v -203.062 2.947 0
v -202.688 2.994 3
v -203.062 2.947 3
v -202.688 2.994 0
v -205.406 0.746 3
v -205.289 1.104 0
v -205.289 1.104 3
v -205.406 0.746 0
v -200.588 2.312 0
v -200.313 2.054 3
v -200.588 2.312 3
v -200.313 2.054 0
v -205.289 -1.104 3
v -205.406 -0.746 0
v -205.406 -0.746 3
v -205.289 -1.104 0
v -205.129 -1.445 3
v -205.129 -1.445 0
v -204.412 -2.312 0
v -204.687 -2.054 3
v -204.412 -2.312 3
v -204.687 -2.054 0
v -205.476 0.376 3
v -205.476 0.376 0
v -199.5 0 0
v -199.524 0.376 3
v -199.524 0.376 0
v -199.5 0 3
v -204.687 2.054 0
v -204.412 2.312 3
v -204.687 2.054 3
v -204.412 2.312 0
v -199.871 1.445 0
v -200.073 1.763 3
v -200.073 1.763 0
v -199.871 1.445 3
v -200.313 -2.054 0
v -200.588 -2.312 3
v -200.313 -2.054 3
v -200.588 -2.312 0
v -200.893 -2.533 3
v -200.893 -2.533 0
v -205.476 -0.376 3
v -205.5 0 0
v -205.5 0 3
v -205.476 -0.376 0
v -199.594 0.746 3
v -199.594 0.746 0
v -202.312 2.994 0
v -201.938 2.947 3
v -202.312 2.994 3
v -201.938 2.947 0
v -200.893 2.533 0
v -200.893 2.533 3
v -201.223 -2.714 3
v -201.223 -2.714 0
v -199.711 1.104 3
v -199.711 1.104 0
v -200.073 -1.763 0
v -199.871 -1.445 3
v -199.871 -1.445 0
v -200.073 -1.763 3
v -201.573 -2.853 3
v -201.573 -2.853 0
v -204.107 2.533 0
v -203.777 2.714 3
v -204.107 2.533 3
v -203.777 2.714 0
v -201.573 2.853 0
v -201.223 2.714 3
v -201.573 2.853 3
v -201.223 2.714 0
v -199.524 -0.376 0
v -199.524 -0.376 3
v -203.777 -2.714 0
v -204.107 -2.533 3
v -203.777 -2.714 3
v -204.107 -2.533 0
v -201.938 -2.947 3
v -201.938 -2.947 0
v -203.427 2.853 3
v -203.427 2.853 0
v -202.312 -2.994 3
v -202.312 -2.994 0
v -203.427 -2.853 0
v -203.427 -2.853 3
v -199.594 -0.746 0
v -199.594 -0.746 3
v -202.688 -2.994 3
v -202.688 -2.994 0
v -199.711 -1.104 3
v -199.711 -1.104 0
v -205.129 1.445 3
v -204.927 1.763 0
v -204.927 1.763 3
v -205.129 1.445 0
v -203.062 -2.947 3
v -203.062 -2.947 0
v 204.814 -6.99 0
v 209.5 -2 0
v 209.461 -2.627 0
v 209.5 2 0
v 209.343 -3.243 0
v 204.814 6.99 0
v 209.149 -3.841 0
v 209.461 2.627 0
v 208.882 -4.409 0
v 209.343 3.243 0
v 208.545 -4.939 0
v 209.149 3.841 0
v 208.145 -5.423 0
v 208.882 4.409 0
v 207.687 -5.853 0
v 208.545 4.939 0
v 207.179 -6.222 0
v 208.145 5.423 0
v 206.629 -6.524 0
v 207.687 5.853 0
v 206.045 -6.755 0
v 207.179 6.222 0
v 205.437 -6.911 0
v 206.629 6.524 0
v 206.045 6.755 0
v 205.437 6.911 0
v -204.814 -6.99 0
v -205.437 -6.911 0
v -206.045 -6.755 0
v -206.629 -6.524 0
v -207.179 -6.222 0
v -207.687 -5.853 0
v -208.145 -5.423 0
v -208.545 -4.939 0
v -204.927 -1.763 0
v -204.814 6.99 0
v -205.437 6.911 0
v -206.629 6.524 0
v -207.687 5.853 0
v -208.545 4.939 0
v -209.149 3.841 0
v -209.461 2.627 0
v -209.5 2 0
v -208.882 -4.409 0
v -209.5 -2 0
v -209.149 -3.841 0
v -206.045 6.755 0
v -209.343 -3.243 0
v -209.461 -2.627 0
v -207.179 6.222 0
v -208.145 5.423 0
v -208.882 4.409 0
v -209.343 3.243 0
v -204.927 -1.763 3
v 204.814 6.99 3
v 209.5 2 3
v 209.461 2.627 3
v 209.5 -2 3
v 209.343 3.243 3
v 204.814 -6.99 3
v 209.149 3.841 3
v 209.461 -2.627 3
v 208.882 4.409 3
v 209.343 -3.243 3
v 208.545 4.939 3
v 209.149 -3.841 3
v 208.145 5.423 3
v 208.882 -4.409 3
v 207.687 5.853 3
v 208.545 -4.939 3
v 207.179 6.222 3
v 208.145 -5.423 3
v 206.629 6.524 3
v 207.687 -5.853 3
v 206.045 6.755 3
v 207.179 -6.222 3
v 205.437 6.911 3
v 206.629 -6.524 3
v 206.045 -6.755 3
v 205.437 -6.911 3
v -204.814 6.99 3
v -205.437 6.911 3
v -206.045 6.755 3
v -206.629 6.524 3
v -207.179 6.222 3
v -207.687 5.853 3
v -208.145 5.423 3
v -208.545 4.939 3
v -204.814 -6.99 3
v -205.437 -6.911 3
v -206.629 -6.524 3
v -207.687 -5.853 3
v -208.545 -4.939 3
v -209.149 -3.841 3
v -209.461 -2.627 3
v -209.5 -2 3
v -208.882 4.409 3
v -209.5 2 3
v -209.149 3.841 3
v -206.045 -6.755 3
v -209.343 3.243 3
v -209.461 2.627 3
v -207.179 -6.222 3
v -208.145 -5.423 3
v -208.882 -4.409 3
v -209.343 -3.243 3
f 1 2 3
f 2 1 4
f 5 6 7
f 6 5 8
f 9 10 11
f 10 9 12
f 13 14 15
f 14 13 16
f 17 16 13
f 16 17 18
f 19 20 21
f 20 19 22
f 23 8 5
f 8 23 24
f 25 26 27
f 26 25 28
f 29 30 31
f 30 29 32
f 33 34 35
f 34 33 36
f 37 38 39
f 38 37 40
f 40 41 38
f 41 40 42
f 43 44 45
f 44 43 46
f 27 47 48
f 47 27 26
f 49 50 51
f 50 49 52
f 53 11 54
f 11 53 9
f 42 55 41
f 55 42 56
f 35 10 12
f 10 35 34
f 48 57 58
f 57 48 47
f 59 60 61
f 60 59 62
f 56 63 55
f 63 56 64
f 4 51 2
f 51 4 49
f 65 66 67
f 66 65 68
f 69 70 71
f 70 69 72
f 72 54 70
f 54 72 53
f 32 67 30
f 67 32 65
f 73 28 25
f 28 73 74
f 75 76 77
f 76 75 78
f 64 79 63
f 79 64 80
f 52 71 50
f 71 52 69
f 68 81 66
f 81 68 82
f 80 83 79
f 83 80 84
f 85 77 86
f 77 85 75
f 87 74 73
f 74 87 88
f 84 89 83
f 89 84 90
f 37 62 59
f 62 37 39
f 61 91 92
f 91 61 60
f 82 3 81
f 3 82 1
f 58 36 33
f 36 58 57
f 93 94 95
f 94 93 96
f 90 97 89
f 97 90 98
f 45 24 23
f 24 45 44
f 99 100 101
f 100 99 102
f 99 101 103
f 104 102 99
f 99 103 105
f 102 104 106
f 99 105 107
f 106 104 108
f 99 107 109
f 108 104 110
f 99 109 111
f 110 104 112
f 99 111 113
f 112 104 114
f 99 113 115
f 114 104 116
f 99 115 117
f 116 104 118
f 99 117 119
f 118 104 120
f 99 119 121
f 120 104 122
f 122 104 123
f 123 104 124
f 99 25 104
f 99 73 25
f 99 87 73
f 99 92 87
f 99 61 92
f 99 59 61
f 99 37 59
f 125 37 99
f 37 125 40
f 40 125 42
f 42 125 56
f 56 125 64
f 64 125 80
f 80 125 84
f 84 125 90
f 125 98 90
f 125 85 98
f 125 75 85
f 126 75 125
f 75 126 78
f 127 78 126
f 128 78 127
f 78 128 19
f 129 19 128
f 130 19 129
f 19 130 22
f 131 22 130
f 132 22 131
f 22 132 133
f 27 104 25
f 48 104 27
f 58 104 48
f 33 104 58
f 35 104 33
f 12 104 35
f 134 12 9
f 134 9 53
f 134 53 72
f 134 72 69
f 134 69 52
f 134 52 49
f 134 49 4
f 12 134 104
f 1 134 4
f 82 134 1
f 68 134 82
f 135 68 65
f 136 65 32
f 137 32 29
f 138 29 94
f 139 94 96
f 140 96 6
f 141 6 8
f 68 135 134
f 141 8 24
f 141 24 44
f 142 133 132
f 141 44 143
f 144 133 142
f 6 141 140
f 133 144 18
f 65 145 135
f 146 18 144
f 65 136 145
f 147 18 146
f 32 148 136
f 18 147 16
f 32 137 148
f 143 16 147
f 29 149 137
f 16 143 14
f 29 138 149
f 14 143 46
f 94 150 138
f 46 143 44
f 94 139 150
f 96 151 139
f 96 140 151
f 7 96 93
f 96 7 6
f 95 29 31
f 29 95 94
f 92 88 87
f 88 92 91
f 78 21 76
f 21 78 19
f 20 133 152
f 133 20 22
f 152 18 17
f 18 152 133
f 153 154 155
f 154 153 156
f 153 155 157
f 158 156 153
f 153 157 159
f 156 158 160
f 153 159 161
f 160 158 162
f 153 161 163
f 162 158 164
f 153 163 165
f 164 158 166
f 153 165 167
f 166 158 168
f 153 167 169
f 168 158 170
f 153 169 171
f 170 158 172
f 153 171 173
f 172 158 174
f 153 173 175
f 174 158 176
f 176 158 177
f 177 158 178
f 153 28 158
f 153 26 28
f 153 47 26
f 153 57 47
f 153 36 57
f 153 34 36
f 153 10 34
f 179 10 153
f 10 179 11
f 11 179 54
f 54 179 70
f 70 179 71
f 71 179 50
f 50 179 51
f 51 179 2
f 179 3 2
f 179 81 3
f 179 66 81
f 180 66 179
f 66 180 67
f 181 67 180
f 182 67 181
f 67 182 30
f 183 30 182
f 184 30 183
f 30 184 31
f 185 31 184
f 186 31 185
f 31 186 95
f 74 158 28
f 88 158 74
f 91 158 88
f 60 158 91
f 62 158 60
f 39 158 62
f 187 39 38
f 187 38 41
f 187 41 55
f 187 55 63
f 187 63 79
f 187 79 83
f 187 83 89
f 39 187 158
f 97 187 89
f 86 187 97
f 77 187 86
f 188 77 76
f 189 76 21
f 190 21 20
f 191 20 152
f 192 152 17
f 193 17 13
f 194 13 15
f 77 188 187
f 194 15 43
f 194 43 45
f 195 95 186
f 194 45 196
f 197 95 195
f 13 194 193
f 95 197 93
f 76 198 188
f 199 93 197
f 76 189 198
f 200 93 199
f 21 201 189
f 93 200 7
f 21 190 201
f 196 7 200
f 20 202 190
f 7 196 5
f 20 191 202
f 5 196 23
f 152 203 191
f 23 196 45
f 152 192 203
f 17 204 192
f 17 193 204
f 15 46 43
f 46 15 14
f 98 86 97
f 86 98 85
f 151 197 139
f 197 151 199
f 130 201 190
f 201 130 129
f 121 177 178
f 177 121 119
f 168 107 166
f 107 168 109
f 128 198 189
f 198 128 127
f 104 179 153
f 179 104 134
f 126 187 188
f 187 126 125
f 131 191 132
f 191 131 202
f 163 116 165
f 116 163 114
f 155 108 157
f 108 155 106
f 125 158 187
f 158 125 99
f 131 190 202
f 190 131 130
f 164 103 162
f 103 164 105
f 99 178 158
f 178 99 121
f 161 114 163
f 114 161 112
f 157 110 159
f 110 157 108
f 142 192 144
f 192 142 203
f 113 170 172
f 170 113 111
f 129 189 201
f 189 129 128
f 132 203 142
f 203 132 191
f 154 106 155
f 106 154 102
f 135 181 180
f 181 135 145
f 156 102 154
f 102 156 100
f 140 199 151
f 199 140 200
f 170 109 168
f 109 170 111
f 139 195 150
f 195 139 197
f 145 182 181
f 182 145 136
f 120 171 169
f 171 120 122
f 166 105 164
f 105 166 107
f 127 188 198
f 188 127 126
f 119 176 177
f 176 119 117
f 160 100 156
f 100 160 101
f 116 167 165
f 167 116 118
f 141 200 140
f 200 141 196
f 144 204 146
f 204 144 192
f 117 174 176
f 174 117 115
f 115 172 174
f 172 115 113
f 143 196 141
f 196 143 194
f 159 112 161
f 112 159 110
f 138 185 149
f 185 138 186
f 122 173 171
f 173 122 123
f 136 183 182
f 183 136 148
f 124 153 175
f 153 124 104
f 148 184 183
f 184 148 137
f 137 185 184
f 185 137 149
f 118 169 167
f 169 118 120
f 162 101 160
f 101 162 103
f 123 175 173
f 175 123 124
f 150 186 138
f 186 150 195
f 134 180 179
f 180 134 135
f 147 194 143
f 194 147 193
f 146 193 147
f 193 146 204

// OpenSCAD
$fn = 50;


difference() {
	union() {
		hull() {
			translate(v = [-204.5000000000, 2.0000000000, 0]) {
				cylinder(h = 3, r = 5);
			}
			translate(v = [204.5000000000, 2.0000000000, 0]) {
				cylinder(h = 3, r = 5);
			}
			translate(v = [-204.5000000000, -2.0000000000, 0]) {
				cylinder(h = 3, r = 5);
			}
			translate(v = [204.5000000000, -2.0000000000, 0]) {
				cylinder(h = 3, r = 5);
			}
		}
	}
	union() {
		translate(v = [-202.5000000000, 0.0000000000, 0]) {
			cylinder(h = 3, r = 3.0000000000);
		}
		translate(v = [-202.5000000000, 0.0000000000, 0]) {
			cylinder(h = 3, r = 1.5000000000);
		}
		translate(v = [-202.5000000000, 0.0000000000, 0]) {
			cylinder(h = 3, r = 1.5000000000);
		}
		translate(v = [-202.5000000000, 0.0000000000, 0]) {
			cylinder(h = 3, r = 1.5000000000);
		}
	}
}
